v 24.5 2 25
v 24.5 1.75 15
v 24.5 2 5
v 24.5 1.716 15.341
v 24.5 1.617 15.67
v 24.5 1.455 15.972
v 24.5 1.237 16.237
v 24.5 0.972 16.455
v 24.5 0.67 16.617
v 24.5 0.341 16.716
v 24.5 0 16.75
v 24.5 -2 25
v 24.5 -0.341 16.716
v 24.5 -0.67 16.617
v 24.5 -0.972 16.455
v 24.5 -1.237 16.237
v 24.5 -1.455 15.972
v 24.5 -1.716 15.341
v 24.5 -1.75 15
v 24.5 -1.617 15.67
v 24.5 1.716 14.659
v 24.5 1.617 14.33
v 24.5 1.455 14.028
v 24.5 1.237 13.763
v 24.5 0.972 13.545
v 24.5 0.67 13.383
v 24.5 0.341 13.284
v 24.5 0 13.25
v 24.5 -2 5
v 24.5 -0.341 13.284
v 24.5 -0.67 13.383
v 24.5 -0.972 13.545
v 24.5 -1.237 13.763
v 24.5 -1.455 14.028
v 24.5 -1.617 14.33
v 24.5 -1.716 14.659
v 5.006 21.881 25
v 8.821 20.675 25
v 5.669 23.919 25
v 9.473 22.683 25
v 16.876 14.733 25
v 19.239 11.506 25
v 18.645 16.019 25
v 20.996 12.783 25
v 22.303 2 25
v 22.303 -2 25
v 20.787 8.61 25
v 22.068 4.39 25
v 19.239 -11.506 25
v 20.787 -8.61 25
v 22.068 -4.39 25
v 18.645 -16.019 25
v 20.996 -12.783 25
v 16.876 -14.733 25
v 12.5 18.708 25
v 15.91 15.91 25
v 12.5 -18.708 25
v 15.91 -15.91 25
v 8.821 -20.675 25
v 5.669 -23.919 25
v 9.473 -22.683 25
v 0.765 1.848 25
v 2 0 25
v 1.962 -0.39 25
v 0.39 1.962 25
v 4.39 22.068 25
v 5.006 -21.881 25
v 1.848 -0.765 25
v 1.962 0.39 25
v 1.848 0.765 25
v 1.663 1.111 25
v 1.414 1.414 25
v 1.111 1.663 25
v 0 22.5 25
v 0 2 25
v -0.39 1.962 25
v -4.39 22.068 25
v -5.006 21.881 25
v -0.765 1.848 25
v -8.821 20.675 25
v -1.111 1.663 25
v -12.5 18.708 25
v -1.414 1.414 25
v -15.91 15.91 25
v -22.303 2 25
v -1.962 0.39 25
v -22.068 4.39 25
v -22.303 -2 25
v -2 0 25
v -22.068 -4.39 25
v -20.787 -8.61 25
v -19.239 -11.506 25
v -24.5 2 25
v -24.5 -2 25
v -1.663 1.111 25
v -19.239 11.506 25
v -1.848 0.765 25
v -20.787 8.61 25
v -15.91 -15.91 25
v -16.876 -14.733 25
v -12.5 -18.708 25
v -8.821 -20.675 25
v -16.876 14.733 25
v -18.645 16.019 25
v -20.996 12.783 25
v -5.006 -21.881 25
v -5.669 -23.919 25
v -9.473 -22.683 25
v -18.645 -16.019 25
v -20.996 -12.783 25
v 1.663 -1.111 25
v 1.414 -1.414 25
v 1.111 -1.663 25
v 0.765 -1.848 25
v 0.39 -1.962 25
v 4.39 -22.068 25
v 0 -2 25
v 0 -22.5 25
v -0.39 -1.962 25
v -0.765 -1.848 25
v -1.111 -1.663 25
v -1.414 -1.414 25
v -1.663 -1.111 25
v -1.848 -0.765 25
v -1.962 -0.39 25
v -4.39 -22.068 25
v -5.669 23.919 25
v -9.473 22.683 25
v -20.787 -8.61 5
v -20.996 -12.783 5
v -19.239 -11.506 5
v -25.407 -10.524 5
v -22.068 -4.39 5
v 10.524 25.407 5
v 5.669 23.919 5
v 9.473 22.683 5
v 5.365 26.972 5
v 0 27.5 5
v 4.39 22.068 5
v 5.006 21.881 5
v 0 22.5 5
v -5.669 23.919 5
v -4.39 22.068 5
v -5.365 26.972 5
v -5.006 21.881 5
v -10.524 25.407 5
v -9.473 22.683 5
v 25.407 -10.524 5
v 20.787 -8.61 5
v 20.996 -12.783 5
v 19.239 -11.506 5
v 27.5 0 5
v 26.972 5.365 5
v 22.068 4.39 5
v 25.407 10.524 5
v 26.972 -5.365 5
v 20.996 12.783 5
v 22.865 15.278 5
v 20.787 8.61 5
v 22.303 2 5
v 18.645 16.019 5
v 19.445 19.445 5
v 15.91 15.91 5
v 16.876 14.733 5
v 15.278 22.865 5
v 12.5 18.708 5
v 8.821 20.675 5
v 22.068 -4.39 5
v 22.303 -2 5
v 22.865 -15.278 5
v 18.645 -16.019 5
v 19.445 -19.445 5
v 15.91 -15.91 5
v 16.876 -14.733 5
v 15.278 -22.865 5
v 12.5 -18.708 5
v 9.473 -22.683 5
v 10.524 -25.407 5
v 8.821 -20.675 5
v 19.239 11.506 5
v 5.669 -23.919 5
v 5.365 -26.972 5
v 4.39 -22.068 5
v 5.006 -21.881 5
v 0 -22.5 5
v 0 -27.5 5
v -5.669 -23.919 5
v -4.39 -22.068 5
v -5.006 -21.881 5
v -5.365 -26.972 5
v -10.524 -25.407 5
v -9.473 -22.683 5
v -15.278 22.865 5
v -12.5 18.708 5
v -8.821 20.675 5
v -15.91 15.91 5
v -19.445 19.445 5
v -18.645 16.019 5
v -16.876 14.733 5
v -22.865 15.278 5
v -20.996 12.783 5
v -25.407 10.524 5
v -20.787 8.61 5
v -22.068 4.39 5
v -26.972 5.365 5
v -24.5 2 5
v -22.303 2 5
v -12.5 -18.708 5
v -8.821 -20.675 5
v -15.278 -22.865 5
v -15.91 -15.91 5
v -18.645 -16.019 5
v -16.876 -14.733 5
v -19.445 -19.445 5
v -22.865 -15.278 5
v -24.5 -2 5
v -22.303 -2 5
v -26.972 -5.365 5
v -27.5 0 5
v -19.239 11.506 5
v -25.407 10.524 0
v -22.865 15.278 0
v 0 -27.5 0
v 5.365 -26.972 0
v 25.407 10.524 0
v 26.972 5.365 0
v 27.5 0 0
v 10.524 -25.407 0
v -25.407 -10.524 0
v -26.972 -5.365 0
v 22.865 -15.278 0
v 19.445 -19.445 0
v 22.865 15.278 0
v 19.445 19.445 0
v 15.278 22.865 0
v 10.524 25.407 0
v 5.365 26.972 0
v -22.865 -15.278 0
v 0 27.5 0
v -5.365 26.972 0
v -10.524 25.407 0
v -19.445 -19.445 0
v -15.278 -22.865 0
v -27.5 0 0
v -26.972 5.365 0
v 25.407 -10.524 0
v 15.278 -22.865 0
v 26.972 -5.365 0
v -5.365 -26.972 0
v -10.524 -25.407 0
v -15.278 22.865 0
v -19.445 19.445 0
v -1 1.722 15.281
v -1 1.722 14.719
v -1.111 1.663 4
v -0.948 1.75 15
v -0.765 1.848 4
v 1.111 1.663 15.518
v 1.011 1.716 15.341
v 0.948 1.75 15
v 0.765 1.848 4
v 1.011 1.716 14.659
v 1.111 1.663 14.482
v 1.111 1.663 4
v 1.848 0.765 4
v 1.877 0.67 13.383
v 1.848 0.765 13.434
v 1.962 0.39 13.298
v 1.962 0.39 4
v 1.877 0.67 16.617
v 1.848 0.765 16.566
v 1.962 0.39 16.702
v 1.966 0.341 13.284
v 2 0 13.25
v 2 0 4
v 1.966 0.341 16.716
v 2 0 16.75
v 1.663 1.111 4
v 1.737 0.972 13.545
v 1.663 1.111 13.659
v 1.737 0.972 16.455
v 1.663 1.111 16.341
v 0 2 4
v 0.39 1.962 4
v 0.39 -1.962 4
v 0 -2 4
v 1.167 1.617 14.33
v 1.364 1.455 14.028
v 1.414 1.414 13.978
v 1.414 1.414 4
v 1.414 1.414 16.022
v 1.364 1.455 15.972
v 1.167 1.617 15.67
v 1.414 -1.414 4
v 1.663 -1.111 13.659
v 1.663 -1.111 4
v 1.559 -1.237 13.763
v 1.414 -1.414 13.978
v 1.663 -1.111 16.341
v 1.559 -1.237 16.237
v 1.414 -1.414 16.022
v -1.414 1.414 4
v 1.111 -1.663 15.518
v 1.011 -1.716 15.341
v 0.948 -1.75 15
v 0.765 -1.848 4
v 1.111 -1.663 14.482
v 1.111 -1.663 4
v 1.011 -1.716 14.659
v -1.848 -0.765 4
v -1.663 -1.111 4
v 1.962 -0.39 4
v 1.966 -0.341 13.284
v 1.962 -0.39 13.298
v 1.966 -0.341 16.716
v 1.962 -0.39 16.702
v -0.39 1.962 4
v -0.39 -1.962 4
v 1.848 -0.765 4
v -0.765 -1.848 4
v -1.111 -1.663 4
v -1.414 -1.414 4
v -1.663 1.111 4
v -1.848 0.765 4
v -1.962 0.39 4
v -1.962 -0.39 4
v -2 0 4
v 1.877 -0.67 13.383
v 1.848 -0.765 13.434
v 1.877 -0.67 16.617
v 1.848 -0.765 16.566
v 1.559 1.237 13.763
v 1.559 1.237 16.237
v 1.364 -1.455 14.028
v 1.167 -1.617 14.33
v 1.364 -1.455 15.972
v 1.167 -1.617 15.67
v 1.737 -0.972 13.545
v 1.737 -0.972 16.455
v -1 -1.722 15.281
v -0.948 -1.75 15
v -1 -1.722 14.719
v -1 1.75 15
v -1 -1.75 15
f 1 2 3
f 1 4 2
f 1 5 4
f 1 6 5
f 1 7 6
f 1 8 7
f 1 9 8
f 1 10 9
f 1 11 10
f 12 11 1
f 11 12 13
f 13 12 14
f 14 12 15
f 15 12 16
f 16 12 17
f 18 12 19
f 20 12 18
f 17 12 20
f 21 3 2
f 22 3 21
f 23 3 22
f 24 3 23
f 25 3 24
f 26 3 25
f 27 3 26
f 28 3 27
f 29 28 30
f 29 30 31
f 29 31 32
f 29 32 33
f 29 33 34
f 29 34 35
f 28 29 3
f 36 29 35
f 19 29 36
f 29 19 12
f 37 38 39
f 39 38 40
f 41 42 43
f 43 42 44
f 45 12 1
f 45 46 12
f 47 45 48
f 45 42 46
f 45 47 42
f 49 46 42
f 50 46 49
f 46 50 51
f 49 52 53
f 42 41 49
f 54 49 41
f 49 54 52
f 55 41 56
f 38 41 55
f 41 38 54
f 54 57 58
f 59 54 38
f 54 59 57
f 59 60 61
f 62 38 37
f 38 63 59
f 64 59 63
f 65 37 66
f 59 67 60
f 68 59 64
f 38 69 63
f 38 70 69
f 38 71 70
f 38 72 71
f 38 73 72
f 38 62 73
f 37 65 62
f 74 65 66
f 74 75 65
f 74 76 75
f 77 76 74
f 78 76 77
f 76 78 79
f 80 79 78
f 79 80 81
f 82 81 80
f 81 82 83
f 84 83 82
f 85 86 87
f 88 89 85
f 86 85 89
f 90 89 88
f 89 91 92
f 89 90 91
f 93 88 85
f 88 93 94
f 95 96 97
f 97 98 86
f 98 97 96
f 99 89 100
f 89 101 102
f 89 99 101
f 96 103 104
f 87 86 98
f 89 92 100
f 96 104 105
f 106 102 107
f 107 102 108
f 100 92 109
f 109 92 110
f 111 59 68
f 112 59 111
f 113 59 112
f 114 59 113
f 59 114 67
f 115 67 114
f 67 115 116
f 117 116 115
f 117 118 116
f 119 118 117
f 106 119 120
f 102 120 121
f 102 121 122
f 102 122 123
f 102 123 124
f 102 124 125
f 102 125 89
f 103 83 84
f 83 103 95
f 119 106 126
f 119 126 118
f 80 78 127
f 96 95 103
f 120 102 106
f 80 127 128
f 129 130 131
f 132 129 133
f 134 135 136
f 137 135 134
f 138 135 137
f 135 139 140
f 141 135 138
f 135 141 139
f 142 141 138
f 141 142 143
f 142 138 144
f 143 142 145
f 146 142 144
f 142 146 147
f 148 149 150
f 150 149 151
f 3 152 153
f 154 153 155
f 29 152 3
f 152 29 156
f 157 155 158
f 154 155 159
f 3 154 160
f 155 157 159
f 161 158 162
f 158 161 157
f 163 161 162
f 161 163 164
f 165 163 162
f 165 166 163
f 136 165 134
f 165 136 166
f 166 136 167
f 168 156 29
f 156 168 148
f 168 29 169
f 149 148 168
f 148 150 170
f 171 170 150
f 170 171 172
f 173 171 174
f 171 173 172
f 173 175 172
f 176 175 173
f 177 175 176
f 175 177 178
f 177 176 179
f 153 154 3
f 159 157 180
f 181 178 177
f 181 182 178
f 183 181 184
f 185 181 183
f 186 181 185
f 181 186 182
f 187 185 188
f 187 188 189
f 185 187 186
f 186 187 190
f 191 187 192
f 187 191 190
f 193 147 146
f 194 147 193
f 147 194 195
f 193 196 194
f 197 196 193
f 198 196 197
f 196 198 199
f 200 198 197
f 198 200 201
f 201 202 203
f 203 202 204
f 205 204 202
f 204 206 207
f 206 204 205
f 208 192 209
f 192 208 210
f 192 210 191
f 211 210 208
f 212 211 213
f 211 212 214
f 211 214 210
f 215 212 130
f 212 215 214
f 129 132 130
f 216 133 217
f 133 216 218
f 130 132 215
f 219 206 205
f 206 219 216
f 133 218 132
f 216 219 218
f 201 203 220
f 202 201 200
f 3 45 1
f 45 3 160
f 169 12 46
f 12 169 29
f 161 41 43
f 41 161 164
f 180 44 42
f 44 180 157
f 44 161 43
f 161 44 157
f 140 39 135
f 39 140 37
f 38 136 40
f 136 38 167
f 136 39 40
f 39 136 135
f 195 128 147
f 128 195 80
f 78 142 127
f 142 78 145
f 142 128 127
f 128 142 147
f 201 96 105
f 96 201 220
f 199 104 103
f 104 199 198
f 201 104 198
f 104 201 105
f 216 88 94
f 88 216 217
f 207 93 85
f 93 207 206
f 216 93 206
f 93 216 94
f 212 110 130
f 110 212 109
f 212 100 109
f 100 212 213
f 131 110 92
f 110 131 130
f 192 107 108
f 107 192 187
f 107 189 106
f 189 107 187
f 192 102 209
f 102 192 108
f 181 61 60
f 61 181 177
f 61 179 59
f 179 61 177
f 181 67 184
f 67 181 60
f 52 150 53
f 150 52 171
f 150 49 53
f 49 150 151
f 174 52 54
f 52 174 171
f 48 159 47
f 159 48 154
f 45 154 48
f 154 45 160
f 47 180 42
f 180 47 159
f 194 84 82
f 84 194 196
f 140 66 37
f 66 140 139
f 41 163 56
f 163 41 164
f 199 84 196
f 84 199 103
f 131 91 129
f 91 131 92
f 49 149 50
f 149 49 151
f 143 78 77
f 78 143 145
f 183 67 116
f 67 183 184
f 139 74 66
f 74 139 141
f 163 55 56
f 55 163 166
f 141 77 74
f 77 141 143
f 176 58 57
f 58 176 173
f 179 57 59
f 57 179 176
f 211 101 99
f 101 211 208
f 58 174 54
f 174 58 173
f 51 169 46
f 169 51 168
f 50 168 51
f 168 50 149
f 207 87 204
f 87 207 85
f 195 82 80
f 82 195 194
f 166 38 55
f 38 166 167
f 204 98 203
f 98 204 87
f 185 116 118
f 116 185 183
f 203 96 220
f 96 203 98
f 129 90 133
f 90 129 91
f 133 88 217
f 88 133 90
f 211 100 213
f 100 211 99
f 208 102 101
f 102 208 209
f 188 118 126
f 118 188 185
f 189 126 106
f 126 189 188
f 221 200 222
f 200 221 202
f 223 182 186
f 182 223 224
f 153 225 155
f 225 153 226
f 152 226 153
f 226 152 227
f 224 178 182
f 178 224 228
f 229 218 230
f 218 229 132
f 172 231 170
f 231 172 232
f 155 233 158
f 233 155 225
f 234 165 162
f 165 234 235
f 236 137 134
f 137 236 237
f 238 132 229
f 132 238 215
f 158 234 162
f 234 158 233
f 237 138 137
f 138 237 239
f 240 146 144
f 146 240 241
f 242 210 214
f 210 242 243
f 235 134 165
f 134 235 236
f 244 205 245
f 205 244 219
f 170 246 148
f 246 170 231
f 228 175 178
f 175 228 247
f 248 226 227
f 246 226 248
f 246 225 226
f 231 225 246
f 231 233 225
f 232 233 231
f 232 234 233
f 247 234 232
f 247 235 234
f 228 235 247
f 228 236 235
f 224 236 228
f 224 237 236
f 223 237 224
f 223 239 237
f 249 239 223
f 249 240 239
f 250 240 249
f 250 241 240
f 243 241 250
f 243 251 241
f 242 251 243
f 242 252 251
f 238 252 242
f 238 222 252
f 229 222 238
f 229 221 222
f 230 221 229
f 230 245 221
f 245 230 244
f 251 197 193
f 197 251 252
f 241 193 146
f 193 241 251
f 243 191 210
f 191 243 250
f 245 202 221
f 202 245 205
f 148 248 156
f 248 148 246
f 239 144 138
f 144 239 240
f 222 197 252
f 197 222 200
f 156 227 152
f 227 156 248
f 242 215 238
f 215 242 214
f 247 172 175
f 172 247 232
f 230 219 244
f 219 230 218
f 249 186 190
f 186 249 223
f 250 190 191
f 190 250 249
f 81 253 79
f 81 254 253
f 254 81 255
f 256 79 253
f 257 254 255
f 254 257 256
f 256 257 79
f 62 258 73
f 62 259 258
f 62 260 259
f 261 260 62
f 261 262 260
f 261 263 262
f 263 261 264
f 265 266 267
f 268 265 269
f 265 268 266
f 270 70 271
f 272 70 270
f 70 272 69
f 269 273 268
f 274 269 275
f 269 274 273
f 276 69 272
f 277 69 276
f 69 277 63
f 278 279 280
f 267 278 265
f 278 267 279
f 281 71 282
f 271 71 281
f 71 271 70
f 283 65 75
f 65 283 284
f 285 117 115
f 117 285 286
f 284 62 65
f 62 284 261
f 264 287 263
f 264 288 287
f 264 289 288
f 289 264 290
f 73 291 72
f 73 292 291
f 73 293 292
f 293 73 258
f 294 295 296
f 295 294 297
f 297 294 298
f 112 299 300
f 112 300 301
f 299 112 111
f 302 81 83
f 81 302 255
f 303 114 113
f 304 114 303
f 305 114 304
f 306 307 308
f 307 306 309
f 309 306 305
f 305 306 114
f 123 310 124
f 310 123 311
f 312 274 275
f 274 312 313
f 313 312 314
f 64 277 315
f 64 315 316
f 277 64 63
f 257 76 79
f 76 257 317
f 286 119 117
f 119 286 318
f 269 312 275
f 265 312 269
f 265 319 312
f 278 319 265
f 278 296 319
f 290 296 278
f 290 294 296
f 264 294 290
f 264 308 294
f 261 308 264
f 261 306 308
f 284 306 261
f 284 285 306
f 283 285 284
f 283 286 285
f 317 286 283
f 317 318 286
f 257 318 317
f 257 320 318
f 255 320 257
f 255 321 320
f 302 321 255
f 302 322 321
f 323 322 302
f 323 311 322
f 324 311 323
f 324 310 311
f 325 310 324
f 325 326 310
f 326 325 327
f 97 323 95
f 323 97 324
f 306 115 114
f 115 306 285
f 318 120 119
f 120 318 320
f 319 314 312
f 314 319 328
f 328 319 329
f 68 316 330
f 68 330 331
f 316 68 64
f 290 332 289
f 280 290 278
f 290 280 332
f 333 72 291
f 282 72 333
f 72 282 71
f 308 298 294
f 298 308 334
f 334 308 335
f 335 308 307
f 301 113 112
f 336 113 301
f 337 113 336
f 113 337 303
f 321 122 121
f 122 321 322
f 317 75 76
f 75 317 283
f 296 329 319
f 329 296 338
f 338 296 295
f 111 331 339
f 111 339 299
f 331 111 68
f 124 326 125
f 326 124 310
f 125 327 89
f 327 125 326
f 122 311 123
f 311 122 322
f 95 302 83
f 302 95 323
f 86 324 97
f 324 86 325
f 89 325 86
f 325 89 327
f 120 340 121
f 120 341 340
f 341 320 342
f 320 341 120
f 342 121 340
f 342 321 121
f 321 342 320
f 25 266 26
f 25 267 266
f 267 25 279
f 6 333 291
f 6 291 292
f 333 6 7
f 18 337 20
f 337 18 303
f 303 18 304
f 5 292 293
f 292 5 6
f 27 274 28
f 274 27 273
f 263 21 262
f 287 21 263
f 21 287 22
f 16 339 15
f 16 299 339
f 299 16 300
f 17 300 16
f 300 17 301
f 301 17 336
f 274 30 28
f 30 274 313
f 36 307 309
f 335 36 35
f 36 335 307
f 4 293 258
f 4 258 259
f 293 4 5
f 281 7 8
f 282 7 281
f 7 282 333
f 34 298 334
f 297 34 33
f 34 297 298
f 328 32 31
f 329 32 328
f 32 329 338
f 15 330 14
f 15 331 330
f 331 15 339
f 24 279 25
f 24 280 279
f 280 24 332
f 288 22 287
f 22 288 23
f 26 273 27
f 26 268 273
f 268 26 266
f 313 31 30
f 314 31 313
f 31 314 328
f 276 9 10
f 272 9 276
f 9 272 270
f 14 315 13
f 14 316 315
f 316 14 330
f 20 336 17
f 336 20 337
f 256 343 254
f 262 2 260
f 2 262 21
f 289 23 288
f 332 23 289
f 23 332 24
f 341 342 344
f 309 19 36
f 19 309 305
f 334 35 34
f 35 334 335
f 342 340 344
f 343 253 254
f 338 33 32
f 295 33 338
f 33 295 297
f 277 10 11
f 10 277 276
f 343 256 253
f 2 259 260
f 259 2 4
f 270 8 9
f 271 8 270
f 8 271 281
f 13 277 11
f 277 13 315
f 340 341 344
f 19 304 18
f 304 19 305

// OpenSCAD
$fn = 32;

// ----------------------------------------------------------------------
// Control knob: skirt knob with grip ribs
// ----------------------------------------------------------------------

// --- parameters (mm) ---
skirt_d = 55;             // skirt diameter
skirt_t = 5;              // skirt thickness
rib_w = 4;                // grip rib width
rib_out = 3;              // grip rib radial protrusion
n_ribs = 10;              // number of grip ribs
knob_d = 45;              // knob body diameter
knob_h = 20;              // knob body height
bore_d = 4;               // shaft bore diameter
set_d = 3.5;              // set screw bore diameter
fit_tol = 0.02;           // tolerance for press fits, mm
free_tol = 0.2;           // tolerance for clearance fits, mm

rib_step = 360 / n_ribs;  // rib angular step
total_h = skirt_t + knob_h;  // overall height

difference() {
  union() {
    translate([0, 0, skirt_t]) cylinder(h = knob_h, d = knob_d);
    cylinder(h = skirt_t, d = skirt_d);
    for (i = [0 : n_ribs - 1])
      rotate([0, 0, i * rib_step])
        translate([knob_d / 2 - 1, -rib_w / 2, skirt_t])
          cube([rib_out, rib_w, knob_h]);
  }
  translate([0, 0, skirt_t - 1]) cylinder(h = knob_h + 2, d = bore_d);
  translate([-1, 0, skirt_t + knob_h / 2]) rotate([0, 90, 0])
    cylinder(h = knob_d / 2 + bore_d / 2 + 2, d = set_d);
}
